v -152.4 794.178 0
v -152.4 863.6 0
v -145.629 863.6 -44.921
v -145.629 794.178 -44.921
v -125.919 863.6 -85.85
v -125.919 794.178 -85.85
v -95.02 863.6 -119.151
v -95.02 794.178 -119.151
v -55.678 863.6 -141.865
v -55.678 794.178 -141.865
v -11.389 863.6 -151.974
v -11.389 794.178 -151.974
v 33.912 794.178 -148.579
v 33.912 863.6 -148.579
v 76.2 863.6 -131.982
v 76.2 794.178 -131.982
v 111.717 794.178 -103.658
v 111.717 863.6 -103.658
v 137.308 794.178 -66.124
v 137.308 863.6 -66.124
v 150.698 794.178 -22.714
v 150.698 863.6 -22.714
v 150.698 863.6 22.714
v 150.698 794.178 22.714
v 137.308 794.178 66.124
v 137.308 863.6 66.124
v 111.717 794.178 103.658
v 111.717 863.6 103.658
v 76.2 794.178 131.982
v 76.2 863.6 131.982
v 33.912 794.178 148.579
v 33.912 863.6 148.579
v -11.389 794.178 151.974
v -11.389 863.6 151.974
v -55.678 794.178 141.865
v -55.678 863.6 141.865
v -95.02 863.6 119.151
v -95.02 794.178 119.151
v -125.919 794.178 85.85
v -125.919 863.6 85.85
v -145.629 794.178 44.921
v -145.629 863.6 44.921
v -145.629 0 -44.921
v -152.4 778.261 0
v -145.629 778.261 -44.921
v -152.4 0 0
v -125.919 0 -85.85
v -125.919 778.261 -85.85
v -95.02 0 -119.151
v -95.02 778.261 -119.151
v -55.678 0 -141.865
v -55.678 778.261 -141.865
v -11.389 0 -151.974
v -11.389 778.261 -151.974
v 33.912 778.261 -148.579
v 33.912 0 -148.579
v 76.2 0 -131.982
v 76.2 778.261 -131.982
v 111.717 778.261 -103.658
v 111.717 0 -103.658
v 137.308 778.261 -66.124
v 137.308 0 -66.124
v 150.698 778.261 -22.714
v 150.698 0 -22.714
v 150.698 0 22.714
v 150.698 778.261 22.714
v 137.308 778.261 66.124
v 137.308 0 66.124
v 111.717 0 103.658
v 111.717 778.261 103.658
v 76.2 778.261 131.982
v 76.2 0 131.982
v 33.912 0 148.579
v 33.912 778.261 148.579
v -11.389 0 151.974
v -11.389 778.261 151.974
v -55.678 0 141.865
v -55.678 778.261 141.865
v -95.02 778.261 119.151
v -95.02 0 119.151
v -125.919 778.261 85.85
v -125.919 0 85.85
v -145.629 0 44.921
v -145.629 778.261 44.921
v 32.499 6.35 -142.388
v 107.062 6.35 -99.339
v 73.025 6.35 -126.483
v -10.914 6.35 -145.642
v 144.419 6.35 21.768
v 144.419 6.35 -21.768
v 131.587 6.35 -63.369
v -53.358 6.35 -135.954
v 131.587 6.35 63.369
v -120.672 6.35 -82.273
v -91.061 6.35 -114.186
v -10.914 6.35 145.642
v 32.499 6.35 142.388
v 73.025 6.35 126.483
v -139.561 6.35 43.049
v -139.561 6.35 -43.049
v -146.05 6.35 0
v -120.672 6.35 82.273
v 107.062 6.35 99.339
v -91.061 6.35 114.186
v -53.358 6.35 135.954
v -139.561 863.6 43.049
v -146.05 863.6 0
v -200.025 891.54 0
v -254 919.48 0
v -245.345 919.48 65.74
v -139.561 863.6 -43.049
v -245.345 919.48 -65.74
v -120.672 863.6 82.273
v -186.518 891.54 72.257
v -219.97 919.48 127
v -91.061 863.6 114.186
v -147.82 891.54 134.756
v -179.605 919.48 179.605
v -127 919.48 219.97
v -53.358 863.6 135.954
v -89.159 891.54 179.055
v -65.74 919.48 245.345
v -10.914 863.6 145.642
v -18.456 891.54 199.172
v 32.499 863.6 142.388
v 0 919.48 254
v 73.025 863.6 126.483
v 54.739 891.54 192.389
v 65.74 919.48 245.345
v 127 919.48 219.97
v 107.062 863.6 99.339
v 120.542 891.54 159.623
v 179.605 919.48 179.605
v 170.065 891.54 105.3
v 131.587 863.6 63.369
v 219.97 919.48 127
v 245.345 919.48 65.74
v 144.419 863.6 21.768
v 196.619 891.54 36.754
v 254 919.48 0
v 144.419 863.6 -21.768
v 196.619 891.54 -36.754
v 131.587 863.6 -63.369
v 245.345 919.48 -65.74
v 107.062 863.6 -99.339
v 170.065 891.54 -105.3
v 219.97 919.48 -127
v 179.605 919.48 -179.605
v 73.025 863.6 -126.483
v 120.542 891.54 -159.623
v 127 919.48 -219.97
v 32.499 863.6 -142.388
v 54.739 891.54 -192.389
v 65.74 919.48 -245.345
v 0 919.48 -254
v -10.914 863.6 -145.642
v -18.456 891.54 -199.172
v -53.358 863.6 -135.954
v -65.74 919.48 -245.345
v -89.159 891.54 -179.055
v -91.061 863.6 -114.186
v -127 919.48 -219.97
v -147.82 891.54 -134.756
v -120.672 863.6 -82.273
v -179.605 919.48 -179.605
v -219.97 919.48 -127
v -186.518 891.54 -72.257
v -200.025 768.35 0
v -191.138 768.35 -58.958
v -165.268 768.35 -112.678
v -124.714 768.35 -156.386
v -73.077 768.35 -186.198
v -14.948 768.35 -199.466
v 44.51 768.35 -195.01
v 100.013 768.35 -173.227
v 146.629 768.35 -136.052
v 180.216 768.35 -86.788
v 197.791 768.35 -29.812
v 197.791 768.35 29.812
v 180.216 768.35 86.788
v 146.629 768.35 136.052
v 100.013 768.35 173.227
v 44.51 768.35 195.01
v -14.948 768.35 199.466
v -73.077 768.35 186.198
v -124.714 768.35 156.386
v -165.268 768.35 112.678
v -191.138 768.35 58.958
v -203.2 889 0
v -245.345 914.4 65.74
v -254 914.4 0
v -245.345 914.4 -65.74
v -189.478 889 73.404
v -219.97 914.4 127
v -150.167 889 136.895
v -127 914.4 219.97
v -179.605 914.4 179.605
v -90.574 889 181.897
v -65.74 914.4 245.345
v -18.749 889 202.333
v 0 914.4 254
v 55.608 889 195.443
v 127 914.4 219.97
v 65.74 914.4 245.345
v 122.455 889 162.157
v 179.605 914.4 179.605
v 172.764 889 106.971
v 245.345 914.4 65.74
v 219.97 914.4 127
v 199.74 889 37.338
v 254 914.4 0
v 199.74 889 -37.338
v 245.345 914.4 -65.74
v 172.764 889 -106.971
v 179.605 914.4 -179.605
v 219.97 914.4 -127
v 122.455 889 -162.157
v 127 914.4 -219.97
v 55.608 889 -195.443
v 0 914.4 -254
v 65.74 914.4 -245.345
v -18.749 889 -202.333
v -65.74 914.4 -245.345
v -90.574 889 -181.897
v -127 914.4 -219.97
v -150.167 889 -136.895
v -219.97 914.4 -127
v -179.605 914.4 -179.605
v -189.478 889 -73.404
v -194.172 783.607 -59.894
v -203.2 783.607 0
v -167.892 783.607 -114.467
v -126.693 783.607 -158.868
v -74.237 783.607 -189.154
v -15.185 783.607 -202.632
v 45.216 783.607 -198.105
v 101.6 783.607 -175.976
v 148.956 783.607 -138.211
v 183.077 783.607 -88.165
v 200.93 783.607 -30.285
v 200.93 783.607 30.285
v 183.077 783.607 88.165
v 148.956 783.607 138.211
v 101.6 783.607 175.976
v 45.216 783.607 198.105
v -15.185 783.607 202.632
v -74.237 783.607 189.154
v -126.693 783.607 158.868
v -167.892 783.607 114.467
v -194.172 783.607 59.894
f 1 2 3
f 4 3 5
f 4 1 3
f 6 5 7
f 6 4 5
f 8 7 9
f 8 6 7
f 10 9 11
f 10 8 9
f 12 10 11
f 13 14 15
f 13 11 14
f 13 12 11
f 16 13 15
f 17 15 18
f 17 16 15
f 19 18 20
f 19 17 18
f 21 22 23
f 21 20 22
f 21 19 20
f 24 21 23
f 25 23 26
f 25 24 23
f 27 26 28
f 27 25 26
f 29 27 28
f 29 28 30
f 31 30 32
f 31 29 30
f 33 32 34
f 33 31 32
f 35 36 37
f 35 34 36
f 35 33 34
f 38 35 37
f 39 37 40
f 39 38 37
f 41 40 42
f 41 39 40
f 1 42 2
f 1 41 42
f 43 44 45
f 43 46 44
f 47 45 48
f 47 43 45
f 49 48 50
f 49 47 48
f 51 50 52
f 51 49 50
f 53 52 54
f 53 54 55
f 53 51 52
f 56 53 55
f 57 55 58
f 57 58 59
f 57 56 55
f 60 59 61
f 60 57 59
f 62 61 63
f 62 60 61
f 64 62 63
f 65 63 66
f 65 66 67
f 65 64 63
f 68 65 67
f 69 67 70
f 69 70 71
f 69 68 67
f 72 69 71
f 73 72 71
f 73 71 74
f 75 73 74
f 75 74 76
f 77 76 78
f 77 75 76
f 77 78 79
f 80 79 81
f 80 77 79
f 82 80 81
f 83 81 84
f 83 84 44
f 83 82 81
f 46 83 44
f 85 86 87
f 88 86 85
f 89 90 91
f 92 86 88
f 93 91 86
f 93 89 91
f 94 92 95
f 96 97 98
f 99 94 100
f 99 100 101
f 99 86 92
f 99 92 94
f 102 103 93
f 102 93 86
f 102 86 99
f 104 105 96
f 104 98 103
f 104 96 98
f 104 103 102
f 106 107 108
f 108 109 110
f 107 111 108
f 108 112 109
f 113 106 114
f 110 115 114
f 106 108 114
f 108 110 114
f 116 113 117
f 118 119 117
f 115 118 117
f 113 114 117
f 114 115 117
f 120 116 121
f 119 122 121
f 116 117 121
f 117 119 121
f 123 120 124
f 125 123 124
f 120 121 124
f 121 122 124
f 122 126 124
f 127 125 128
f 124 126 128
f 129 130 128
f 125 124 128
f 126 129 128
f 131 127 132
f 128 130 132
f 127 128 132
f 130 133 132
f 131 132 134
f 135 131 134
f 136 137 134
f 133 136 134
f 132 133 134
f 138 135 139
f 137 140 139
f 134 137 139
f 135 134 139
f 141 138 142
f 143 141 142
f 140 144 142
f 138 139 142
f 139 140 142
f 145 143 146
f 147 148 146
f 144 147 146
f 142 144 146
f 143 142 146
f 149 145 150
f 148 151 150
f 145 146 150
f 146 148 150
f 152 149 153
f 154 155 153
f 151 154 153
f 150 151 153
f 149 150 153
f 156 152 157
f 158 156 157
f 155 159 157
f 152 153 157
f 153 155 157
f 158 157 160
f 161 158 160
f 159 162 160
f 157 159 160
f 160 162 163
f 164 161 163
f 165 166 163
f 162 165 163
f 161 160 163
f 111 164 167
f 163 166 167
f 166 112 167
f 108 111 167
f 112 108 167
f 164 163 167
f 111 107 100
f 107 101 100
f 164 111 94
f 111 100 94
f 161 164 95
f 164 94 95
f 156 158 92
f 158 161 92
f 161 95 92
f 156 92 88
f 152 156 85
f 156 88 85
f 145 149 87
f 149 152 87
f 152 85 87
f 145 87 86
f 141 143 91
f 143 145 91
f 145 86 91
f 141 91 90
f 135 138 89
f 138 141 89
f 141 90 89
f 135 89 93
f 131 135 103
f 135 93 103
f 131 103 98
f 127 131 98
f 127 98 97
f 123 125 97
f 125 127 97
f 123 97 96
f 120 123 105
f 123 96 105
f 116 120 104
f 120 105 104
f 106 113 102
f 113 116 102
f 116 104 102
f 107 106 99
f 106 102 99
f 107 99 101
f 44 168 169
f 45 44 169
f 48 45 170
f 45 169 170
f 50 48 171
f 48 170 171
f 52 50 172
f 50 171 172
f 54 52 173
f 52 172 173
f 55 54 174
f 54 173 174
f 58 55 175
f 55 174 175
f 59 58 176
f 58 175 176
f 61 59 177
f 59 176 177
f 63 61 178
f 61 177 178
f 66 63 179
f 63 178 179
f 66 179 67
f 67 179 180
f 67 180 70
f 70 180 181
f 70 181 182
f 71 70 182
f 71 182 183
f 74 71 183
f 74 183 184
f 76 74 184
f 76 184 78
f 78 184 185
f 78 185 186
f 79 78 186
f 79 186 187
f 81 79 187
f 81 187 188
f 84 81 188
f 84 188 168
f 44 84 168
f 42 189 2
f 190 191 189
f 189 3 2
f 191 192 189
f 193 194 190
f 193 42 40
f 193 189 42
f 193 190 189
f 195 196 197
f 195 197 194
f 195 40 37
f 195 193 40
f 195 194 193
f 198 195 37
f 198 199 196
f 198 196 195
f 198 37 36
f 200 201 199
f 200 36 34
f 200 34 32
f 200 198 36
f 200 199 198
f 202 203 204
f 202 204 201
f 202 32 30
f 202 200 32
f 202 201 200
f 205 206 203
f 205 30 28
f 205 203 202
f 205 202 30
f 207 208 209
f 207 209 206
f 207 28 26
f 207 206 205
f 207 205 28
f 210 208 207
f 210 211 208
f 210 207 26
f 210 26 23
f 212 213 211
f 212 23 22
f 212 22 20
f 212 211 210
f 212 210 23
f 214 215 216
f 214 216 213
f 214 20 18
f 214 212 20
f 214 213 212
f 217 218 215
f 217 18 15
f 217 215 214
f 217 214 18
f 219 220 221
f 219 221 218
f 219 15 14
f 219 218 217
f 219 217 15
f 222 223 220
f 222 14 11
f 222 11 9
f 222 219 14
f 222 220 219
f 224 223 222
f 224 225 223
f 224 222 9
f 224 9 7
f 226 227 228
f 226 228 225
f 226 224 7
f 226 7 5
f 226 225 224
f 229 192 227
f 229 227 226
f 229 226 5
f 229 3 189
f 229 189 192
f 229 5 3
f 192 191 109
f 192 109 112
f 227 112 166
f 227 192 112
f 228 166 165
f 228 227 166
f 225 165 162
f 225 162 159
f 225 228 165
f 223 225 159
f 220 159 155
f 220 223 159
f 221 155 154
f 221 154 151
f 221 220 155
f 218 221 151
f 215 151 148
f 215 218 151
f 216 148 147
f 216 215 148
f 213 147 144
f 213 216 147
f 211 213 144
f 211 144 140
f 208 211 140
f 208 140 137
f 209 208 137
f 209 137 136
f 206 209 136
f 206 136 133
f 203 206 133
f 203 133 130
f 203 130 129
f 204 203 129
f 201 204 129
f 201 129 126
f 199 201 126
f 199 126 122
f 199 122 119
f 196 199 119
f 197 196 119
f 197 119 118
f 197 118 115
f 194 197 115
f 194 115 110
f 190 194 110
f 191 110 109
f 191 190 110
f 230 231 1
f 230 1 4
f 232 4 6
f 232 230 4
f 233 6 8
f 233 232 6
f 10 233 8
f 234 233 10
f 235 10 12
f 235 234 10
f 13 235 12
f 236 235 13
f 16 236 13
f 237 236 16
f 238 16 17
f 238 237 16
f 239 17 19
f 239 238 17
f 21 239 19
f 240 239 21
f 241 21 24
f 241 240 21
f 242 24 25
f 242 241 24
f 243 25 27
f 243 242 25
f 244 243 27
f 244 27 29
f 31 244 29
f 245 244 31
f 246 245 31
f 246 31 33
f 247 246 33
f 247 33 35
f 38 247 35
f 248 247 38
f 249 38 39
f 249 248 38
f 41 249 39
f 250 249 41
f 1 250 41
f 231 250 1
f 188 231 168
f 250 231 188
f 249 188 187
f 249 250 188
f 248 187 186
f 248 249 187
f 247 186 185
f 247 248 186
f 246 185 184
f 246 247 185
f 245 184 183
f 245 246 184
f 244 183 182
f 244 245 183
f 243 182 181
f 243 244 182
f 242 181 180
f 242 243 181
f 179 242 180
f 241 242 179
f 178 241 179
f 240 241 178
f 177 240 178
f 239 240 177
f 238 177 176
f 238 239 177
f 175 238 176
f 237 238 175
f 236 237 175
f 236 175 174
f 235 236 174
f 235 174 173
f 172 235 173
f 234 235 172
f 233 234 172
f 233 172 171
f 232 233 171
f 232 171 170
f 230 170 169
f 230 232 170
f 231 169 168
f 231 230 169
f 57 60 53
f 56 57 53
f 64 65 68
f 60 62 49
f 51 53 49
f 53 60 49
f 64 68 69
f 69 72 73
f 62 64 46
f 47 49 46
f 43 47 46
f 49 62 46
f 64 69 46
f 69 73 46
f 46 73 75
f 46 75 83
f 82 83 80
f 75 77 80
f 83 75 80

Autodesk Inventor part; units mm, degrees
ref_plane "YZ Plane" through (0, 0, 0) normal (1, 0, 0) x (0, 1, 0)
ref_plane "XZ Plane" through (0, 0, 0) normal (0, 1, 0) x (-1, 0, 0)
sketch "Sketch1" plane through (0, 0, 0) normal (0, 1, 0) x (-1, 0, 0)
  circle A0 centre (0, 0) radius 152.4
  circle A1 centre (0, 0) radius 146.05
  dimension "d0" = 304.8
  dimension "d1" = 6.35
extrude "Extrusion1" add sketch "Sketch1" along normal blind 863.6
extrude "Extrusion2" add sketch "Sketch1" along normal blind 6.35 contours A1
sketch "Sketch2" plane through (0, 6.35, 0) normal (0, 1, 0) x (1, 0, 0)
  line L0 (-219.9994, 0) -> (351.4578, 0)
  point P0 (0, 0)
ref_plane "Work Plane1" through (-219.9994, 6.35, 0) normal (0, 0, 1) x (1, 0, 0)
sketch "Sketch3" plane through (-219.9994, 6.35, 0) normal (0, 0, 1) x (1, 0, 0)
  line L0 (372.3994, 857.25) -> (67.5994, 857.25) projected
  line L1 (67.5994, 857.25) -> (67.5994, 913.13)
  line L2 (67.5994, 913.13) -> (-34.0006, 913.13)
  line L3 (-34.0006, 913.13) -> (-34.0006, 908.05)
  line L4 (-34.0006, 908.05) -> (67.5994, 857.25)
  line L5 (73.9494, 857.25) -> (366.0494, 857.25) projected
  line L6 (73.9494, 857.25) -> (-34.0006, 913.13)
  line L7 (219.9994, 947.7824) -> (219.9994, 874.9501)
  line L8 (372.3994, 857.25) -> (67.5994, 857.25) projected
  line L9 (372.3994, -6.35) -> (67.5994, -6.35) projected
  line L10 (67.5994, -6.35) -> (67.5994, 857.25) projected
  line L11 (67.5994, -6.35) -> (67.5994, 857.25) projected
  line L12 (67.5994, 771.9109) -> (19.9744, 762)
  line L13 (19.9744, 762) -> (16.7994, 777.2569)
  line L14 (16.7994, 777.2569) -> (67.5994, 787.8285)
  line L15 (67.5994, -6.35) -> (67.5994, 857.25) projected
  point P0 (219.9994, -6.35)
  point P1 (67.5994, 787.8285)
  dimension "d6" = 55.88
  dimension "d7" = 101.6
  dimension "d8" = 5.08
revolve "Revolution1" add sketch "Sketch3" angle 360 about axis through (0, 954.1324, 0) along (0, -1, 0) contours L10 L12 L13 L14 | L0 L1 L6 | L4 L3 L6 L1
properties part number "Trash bin casing X1" material "Stainless Steel"
